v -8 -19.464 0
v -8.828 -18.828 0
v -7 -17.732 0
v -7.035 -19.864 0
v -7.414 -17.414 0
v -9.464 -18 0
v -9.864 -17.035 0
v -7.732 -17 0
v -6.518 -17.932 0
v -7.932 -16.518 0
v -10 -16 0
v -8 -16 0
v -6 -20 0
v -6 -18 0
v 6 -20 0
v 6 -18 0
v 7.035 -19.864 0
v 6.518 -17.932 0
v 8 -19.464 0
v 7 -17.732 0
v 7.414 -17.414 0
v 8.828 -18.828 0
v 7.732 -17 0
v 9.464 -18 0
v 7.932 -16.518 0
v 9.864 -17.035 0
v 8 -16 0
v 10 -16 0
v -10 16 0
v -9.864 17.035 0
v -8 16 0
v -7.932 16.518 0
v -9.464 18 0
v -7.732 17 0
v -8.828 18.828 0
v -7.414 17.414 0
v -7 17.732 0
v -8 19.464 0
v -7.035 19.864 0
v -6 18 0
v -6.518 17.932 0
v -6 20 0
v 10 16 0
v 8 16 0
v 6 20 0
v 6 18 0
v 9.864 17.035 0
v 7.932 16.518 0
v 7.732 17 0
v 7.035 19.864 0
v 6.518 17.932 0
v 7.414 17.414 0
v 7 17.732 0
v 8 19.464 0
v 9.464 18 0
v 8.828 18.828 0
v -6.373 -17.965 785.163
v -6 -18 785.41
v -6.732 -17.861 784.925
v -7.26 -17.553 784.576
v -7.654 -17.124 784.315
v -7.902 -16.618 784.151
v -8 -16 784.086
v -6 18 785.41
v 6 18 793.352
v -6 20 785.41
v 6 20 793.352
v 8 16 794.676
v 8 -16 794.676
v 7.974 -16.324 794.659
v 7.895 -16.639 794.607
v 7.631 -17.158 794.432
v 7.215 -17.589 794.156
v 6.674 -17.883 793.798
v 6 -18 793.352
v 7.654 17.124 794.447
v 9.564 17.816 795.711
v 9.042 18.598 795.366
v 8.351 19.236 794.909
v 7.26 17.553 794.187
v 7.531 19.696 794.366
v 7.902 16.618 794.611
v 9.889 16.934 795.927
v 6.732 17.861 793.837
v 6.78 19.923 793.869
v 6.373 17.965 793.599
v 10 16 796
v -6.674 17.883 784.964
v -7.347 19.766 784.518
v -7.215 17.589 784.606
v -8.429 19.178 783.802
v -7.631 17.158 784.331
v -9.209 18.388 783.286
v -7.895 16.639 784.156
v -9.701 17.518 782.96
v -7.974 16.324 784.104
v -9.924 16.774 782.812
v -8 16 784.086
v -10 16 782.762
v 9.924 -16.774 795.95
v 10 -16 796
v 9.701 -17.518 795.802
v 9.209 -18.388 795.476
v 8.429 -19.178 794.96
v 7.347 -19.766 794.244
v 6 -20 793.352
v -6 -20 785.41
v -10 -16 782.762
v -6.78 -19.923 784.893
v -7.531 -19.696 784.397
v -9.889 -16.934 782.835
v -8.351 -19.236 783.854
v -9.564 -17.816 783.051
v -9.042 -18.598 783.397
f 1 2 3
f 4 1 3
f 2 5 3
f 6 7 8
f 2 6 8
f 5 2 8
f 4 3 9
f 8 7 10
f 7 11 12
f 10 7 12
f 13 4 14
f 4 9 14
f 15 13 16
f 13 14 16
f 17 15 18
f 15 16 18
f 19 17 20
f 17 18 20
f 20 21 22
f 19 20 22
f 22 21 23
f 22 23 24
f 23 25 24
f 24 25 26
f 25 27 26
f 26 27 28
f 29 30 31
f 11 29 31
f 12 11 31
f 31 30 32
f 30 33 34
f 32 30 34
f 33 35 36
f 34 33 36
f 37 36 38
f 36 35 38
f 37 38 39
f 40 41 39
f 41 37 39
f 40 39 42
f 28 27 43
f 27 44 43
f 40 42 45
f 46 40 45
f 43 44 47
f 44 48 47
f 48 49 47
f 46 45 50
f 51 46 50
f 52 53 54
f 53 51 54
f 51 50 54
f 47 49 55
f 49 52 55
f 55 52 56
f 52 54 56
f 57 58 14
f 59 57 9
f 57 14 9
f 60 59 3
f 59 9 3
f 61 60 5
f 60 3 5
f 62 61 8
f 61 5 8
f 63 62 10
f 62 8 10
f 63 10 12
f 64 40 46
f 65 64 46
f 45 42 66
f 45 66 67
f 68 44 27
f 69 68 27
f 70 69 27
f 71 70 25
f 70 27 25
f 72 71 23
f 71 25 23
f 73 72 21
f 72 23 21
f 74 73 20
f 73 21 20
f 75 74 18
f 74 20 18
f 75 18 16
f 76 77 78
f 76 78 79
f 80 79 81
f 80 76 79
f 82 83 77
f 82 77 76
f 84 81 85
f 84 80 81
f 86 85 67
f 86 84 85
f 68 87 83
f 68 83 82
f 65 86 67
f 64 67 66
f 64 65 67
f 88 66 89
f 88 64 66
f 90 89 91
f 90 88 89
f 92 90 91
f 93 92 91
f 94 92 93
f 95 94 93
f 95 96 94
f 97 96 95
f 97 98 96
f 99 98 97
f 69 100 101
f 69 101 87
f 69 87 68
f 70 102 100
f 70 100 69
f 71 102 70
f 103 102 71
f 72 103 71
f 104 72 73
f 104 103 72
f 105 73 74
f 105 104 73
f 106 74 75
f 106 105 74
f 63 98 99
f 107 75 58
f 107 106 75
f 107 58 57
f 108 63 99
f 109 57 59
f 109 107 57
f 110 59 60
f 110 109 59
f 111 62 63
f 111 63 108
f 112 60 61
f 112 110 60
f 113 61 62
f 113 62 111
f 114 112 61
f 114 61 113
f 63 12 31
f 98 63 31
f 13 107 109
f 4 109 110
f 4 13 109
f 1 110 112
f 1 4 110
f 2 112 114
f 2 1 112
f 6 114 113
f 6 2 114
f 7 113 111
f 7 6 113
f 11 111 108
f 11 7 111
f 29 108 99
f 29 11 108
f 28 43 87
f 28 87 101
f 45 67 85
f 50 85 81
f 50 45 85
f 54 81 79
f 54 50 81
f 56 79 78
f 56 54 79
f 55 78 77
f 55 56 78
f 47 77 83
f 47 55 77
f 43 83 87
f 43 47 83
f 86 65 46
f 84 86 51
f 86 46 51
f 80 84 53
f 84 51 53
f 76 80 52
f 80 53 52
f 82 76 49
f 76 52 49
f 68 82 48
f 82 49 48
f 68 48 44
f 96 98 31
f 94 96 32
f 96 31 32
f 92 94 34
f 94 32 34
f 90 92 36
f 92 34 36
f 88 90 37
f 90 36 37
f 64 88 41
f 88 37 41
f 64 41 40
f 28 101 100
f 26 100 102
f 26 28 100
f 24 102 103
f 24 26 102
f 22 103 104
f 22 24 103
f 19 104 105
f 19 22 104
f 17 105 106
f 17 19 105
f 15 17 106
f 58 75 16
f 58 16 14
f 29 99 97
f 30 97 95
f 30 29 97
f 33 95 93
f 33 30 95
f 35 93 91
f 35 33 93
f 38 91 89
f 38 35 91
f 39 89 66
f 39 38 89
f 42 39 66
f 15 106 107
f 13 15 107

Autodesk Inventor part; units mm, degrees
ref_plane "YZ Plane" through (0, 0, 0) normal (1, 0, 0) x (0, 1, 0)
ref_plane "Start plane" through (0, 0, 0) normal (0, 0, 1) x (1, 0, 0)
ref_plane "End plane" through (0, 0, 796) normal (0, 0, 1) x (1, 0, 0)
sketch "Sketch" plane through (0, 0, 0) normal (0, 0, 1) x (1, 0, 0)
  line L0 (-10, -16) -> (-10, 16)
  line L1 (-6, 20) -> (6, 20)
  line L2 (10, 16) -> (10, -16)
  line L3 (6, -20) -> (-6, -20)
  arc A0 (-10, -16) -> (-6, -20) centre (-6, -16) ccw
  arc A1 (10, 16) -> (6, 20) centre (6, 16) ccw
  arc A2 (-6, 20) -> (-10, 16) centre (-6, 16) ccw
  arc A3 (6, -20) -> (10, -16) centre (6, -16) ccw
  arc A4 (-6, 18) -> (-8, 16) centre (-6, 16) ccw
  line L4 (-6, 18) -> (6, 18)
  arc A5 (8, 16) -> (6, 18) centre (6, 16) ccw
  line L5 (8, 16) -> (8, -16)
  arc A6 (6, -18) -> (8, -16) centre (6, -16) ccw
  line L6 (6, -18) -> (-6, -18)
  arc A7 (-8, -16) -> (-6, -18) centre (-6, -16) ccw
  line L7 (-8, -16) -> (-8, 16)
  line L8 (0, 29.1598) -> (0, -29.1598) construction
  line L9 (-15.1598, 0) -> (15.1598, 0) construction
  dimension "d7" = 4
  dimension "d9" = 20
  dimension "d11" = 40
  dimension "d12" = 2
  dimension "d15" = 10
  dimension "d16" = 20
extrude "Body" add sketch "Sketch" along normal up to surface (796 mm away) from surface at 0
sketch "Sketch3" plane through (0, 0, 0) normal (0, 0, 1) x (1, 0, 0)
  line L0 (0, 0) -> (10, 0)
ref_plane "Work Plane3" through (0, 0, 0) normal (0, -1, 0) x (1, 0, 0)
sketch "Sketch5" plane through (-6, -20, 0) normal (0, -1, 0) x (1, 0, 0)
  line L0 (-4, 0) -> (-4, 796) projected
  line L1 (-4, 796) -> (0, 796) projected
  line L2 (12, 796) -> (0, 796) projected
  line L3 (12, 796) -> (16, 796) projected
  line L4 (16, 0) -> (16, 796) projected
  line L5 (16, 796) -> (-4, 782.7623)
  point P0 (6, 0)
  dimension "d19" = 33.5
extrude "Extrusion2" cut sketch "Sketch5" against normal through all
sketch "Sketch4" plane through (0, 0, 0) normal (0, -1, 0) x (1, 0, 0)
  line L0 (-2, 0) -> (12, 0) projected
  line L1 (-2, 796) -> (12, 796) projected
  dimension "d18" = 796
equation "\"d7\" = G_IR"
equation "\"d9\" = G_W"
equation "\"d11\" = G_H"
equation "\"d12\" = G_T"
equation "\"d15\" = 0.5 * d9"
equation "\"d16\" = 0.5 * d11"
equation "\"d3\" = G_L"
equation "\"G_W\" = 20"
equation "\"G_H\" = 40"
equation "\"G_T\" = 2"
equation "\"G_IR\" = 4"
equation "\"G_L\" = d18"
equation "\"G_OFFSET_START\" = 0"
equation "\"G_OFFSET_END\" = 0"
equation "\"d14\" = G_OFFSET_END + B_L"
equation "\"B_L\" = 796"
properties part number "ISO 4019 - 40x20x2 - 796" material "Steel, Mild"
